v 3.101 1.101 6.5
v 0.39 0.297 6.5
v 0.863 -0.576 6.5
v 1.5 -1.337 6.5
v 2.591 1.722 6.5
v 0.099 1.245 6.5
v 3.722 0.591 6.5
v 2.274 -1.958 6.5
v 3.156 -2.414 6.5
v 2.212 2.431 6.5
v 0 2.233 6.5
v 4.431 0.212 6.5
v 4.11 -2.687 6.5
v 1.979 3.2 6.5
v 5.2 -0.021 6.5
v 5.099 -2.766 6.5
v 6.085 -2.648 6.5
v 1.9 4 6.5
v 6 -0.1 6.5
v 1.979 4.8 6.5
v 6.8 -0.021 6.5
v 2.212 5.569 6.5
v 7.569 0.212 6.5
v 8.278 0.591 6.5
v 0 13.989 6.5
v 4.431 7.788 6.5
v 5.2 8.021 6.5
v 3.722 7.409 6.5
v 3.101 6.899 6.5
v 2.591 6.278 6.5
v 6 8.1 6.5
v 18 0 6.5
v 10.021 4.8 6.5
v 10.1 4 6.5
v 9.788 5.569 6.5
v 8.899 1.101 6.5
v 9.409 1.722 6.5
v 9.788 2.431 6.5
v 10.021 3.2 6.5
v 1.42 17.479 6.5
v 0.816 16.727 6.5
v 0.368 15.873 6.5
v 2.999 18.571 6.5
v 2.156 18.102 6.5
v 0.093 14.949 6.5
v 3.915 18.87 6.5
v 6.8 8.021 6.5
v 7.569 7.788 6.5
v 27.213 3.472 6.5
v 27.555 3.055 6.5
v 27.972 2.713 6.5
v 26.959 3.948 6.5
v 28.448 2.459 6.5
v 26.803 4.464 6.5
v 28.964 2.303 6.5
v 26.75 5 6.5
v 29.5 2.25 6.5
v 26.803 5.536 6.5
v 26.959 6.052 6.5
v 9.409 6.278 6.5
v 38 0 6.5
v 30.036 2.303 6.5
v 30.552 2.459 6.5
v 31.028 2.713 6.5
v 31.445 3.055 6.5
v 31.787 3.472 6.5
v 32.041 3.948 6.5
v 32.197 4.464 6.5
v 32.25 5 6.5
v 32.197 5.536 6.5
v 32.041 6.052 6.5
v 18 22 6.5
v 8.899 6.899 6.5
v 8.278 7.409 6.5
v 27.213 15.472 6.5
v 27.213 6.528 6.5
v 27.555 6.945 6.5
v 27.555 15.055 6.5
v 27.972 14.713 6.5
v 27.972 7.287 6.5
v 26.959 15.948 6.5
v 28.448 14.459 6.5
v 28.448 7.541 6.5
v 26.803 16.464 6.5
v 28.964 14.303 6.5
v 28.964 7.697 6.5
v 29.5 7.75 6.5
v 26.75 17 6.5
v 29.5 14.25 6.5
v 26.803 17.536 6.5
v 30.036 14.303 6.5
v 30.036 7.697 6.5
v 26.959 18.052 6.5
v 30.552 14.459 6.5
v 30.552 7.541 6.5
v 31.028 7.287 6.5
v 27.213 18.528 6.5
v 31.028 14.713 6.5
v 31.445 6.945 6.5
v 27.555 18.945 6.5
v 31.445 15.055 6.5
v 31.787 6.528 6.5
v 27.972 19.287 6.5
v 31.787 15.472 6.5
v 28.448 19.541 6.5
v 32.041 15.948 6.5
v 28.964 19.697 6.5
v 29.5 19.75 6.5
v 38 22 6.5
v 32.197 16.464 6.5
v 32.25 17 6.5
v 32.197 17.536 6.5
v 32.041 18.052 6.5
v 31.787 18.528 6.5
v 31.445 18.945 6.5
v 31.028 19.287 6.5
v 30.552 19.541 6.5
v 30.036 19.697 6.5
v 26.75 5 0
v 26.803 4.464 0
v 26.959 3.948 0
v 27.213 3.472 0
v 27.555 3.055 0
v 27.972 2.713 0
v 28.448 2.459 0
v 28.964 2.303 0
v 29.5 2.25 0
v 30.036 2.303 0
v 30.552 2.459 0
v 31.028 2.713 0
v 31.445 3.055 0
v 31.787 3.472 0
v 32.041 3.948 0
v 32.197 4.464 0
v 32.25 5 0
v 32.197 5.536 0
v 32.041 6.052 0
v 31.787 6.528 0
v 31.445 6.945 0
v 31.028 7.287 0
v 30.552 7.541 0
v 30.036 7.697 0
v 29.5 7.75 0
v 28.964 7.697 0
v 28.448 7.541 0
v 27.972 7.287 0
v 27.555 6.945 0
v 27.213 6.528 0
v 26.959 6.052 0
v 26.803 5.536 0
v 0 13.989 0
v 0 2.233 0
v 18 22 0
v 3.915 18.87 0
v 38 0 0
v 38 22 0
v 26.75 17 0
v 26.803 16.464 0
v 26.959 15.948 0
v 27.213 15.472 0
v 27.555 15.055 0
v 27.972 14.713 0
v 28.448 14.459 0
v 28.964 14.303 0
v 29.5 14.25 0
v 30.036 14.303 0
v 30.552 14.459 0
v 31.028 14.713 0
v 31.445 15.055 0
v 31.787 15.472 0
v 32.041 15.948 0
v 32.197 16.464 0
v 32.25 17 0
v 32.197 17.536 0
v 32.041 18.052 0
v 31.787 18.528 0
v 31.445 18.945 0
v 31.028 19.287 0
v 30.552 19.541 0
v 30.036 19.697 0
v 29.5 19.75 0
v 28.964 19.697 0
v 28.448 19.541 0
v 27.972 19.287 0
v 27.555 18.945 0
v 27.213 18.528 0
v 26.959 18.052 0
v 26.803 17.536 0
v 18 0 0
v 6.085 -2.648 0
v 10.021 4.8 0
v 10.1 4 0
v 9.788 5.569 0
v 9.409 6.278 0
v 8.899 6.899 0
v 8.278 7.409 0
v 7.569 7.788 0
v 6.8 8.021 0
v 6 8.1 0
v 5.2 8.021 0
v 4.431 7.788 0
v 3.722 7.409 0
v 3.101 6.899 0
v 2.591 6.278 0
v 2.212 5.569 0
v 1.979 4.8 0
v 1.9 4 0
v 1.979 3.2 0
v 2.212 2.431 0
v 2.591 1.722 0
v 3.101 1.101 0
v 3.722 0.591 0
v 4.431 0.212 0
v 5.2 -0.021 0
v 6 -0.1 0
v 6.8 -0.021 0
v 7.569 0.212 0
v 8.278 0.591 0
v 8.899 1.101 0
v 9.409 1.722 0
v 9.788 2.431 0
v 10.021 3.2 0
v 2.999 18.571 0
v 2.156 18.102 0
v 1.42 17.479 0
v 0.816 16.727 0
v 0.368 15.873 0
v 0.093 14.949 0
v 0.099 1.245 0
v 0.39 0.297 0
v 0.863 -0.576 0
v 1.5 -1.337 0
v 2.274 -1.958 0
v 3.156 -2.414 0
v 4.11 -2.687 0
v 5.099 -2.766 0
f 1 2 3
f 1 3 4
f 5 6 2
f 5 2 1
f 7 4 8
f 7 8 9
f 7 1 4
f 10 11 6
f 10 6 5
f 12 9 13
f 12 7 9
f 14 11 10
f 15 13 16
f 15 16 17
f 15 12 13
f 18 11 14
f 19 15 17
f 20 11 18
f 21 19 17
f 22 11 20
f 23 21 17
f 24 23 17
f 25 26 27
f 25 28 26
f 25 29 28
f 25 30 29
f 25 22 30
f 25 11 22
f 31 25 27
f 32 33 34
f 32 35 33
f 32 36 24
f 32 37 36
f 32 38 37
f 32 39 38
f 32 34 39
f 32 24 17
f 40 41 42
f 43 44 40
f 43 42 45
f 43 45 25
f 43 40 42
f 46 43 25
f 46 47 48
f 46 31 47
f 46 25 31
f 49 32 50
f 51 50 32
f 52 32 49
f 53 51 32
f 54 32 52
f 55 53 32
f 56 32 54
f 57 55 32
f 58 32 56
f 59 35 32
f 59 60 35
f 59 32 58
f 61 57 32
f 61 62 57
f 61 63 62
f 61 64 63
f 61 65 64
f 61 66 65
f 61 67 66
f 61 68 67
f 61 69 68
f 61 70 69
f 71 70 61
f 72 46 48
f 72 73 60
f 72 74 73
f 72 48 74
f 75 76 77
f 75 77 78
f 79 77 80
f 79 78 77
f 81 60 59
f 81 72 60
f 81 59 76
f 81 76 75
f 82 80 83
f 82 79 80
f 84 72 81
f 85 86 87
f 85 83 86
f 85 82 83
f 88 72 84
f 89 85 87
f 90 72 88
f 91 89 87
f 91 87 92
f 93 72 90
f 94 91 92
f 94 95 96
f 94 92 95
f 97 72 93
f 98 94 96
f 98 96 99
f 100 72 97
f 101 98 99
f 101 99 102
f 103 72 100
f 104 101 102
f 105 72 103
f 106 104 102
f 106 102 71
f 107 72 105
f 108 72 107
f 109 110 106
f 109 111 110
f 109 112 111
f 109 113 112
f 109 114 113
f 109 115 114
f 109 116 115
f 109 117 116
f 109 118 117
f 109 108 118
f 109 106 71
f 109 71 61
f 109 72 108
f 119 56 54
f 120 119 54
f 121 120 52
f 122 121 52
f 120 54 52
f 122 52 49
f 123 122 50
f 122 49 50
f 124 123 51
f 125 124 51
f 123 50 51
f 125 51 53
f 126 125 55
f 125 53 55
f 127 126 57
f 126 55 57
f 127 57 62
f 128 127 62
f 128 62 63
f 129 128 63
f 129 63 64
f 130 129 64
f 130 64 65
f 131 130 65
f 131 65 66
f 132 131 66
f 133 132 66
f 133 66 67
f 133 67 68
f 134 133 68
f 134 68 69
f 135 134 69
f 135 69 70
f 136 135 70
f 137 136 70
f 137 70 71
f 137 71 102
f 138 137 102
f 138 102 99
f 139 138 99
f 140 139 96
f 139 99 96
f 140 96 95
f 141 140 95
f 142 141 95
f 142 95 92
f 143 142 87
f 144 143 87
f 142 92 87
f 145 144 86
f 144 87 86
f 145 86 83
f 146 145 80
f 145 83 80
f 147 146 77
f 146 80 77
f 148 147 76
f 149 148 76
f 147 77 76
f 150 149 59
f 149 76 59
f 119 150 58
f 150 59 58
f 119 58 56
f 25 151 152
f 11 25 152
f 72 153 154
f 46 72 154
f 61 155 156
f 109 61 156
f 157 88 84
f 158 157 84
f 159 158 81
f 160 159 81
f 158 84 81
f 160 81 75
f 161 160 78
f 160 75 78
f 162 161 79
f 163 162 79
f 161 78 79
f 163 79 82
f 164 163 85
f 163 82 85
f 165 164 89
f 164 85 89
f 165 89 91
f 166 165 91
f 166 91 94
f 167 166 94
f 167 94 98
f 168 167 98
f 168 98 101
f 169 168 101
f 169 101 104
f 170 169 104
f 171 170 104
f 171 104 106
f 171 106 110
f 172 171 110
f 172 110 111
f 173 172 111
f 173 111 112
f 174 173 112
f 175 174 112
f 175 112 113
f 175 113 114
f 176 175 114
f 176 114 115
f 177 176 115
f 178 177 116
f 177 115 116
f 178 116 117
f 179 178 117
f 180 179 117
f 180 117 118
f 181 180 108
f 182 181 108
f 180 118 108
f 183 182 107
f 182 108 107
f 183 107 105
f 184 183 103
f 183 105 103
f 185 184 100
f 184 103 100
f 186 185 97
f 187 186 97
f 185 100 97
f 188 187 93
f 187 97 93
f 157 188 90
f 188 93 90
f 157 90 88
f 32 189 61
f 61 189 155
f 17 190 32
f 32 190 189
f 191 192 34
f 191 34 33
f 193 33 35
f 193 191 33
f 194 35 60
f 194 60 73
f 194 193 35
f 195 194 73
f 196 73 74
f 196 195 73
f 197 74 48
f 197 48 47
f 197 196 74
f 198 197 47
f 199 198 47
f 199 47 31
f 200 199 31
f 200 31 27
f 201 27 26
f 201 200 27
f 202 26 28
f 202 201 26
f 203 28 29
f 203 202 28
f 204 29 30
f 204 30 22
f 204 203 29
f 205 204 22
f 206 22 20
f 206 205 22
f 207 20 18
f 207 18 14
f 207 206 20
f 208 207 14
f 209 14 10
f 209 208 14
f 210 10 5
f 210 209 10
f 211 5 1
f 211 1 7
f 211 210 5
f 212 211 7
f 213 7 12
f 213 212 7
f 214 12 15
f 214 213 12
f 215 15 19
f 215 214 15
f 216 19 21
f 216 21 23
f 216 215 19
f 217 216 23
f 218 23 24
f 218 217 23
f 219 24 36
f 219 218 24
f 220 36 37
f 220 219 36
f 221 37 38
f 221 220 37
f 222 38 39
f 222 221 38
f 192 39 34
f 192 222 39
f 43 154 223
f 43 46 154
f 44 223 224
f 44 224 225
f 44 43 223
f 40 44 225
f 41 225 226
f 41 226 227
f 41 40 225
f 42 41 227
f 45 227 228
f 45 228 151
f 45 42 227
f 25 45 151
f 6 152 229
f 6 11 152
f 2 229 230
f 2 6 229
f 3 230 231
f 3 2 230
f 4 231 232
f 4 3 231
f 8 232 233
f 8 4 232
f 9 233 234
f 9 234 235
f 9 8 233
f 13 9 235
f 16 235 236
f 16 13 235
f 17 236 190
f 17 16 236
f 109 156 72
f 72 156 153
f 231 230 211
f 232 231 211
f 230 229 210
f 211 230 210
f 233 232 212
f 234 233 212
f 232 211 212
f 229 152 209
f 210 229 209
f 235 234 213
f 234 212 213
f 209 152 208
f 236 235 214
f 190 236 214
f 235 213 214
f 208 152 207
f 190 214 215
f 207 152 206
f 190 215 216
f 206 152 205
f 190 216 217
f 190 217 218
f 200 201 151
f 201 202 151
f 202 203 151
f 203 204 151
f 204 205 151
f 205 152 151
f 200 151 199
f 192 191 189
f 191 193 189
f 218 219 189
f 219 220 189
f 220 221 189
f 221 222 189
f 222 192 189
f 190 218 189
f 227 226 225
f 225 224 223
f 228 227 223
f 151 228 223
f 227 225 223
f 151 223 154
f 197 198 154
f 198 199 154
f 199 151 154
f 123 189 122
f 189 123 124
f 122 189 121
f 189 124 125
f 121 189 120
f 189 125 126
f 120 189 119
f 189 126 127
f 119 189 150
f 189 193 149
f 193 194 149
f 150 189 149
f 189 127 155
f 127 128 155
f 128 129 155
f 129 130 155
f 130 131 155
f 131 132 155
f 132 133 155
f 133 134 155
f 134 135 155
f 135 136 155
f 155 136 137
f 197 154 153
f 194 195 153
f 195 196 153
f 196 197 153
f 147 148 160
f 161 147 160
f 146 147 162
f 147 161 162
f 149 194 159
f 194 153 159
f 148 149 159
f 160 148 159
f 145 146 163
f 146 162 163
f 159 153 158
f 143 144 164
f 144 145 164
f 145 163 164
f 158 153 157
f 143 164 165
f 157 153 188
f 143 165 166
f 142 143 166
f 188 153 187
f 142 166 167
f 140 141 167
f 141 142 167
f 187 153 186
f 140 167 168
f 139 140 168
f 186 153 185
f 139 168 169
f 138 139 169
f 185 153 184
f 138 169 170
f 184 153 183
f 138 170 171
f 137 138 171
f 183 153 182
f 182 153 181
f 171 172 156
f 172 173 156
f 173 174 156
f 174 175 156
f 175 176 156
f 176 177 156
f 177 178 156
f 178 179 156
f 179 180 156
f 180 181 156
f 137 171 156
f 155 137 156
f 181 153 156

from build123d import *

# Parameters (mm, degrees)
F0_R     = 4.1
F1_DEPTH = 6.5
F2_D     = 5.5
F3_R     = 5


with BuildPart() as f1:
    # F0 (on Top) → F1 (new body)
    with BuildSketch(Plane.XY):
        Polygon((18, 22), (0, 18), (0, 0), (0, -4), (18, 0), (38, 0), (38, 22), align=None)
        with Locations((6, 4)):
            Circle(F0_R, mode=Mode.SUBTRACT)
    extrude(amount=F1_DEPTH)

    # F2 (through all)
    with Locations(Plane(origin=(0, 0, 0), x_dir=(1, 0, 0), z_dir=(0, 0, -1))):
        with Locations((29.5, -17), (29.5, -5)):
            Hole(F2_D / 2)

    # F3
    f3_edges = [f1.edges().sort_by_distance(p)[0] for p in [
        (0, 18, 3.25),
        (0, -4, 3.25),
    ]]
    fillet(f3_edges, radius=F3_R)


solid = f1.part
